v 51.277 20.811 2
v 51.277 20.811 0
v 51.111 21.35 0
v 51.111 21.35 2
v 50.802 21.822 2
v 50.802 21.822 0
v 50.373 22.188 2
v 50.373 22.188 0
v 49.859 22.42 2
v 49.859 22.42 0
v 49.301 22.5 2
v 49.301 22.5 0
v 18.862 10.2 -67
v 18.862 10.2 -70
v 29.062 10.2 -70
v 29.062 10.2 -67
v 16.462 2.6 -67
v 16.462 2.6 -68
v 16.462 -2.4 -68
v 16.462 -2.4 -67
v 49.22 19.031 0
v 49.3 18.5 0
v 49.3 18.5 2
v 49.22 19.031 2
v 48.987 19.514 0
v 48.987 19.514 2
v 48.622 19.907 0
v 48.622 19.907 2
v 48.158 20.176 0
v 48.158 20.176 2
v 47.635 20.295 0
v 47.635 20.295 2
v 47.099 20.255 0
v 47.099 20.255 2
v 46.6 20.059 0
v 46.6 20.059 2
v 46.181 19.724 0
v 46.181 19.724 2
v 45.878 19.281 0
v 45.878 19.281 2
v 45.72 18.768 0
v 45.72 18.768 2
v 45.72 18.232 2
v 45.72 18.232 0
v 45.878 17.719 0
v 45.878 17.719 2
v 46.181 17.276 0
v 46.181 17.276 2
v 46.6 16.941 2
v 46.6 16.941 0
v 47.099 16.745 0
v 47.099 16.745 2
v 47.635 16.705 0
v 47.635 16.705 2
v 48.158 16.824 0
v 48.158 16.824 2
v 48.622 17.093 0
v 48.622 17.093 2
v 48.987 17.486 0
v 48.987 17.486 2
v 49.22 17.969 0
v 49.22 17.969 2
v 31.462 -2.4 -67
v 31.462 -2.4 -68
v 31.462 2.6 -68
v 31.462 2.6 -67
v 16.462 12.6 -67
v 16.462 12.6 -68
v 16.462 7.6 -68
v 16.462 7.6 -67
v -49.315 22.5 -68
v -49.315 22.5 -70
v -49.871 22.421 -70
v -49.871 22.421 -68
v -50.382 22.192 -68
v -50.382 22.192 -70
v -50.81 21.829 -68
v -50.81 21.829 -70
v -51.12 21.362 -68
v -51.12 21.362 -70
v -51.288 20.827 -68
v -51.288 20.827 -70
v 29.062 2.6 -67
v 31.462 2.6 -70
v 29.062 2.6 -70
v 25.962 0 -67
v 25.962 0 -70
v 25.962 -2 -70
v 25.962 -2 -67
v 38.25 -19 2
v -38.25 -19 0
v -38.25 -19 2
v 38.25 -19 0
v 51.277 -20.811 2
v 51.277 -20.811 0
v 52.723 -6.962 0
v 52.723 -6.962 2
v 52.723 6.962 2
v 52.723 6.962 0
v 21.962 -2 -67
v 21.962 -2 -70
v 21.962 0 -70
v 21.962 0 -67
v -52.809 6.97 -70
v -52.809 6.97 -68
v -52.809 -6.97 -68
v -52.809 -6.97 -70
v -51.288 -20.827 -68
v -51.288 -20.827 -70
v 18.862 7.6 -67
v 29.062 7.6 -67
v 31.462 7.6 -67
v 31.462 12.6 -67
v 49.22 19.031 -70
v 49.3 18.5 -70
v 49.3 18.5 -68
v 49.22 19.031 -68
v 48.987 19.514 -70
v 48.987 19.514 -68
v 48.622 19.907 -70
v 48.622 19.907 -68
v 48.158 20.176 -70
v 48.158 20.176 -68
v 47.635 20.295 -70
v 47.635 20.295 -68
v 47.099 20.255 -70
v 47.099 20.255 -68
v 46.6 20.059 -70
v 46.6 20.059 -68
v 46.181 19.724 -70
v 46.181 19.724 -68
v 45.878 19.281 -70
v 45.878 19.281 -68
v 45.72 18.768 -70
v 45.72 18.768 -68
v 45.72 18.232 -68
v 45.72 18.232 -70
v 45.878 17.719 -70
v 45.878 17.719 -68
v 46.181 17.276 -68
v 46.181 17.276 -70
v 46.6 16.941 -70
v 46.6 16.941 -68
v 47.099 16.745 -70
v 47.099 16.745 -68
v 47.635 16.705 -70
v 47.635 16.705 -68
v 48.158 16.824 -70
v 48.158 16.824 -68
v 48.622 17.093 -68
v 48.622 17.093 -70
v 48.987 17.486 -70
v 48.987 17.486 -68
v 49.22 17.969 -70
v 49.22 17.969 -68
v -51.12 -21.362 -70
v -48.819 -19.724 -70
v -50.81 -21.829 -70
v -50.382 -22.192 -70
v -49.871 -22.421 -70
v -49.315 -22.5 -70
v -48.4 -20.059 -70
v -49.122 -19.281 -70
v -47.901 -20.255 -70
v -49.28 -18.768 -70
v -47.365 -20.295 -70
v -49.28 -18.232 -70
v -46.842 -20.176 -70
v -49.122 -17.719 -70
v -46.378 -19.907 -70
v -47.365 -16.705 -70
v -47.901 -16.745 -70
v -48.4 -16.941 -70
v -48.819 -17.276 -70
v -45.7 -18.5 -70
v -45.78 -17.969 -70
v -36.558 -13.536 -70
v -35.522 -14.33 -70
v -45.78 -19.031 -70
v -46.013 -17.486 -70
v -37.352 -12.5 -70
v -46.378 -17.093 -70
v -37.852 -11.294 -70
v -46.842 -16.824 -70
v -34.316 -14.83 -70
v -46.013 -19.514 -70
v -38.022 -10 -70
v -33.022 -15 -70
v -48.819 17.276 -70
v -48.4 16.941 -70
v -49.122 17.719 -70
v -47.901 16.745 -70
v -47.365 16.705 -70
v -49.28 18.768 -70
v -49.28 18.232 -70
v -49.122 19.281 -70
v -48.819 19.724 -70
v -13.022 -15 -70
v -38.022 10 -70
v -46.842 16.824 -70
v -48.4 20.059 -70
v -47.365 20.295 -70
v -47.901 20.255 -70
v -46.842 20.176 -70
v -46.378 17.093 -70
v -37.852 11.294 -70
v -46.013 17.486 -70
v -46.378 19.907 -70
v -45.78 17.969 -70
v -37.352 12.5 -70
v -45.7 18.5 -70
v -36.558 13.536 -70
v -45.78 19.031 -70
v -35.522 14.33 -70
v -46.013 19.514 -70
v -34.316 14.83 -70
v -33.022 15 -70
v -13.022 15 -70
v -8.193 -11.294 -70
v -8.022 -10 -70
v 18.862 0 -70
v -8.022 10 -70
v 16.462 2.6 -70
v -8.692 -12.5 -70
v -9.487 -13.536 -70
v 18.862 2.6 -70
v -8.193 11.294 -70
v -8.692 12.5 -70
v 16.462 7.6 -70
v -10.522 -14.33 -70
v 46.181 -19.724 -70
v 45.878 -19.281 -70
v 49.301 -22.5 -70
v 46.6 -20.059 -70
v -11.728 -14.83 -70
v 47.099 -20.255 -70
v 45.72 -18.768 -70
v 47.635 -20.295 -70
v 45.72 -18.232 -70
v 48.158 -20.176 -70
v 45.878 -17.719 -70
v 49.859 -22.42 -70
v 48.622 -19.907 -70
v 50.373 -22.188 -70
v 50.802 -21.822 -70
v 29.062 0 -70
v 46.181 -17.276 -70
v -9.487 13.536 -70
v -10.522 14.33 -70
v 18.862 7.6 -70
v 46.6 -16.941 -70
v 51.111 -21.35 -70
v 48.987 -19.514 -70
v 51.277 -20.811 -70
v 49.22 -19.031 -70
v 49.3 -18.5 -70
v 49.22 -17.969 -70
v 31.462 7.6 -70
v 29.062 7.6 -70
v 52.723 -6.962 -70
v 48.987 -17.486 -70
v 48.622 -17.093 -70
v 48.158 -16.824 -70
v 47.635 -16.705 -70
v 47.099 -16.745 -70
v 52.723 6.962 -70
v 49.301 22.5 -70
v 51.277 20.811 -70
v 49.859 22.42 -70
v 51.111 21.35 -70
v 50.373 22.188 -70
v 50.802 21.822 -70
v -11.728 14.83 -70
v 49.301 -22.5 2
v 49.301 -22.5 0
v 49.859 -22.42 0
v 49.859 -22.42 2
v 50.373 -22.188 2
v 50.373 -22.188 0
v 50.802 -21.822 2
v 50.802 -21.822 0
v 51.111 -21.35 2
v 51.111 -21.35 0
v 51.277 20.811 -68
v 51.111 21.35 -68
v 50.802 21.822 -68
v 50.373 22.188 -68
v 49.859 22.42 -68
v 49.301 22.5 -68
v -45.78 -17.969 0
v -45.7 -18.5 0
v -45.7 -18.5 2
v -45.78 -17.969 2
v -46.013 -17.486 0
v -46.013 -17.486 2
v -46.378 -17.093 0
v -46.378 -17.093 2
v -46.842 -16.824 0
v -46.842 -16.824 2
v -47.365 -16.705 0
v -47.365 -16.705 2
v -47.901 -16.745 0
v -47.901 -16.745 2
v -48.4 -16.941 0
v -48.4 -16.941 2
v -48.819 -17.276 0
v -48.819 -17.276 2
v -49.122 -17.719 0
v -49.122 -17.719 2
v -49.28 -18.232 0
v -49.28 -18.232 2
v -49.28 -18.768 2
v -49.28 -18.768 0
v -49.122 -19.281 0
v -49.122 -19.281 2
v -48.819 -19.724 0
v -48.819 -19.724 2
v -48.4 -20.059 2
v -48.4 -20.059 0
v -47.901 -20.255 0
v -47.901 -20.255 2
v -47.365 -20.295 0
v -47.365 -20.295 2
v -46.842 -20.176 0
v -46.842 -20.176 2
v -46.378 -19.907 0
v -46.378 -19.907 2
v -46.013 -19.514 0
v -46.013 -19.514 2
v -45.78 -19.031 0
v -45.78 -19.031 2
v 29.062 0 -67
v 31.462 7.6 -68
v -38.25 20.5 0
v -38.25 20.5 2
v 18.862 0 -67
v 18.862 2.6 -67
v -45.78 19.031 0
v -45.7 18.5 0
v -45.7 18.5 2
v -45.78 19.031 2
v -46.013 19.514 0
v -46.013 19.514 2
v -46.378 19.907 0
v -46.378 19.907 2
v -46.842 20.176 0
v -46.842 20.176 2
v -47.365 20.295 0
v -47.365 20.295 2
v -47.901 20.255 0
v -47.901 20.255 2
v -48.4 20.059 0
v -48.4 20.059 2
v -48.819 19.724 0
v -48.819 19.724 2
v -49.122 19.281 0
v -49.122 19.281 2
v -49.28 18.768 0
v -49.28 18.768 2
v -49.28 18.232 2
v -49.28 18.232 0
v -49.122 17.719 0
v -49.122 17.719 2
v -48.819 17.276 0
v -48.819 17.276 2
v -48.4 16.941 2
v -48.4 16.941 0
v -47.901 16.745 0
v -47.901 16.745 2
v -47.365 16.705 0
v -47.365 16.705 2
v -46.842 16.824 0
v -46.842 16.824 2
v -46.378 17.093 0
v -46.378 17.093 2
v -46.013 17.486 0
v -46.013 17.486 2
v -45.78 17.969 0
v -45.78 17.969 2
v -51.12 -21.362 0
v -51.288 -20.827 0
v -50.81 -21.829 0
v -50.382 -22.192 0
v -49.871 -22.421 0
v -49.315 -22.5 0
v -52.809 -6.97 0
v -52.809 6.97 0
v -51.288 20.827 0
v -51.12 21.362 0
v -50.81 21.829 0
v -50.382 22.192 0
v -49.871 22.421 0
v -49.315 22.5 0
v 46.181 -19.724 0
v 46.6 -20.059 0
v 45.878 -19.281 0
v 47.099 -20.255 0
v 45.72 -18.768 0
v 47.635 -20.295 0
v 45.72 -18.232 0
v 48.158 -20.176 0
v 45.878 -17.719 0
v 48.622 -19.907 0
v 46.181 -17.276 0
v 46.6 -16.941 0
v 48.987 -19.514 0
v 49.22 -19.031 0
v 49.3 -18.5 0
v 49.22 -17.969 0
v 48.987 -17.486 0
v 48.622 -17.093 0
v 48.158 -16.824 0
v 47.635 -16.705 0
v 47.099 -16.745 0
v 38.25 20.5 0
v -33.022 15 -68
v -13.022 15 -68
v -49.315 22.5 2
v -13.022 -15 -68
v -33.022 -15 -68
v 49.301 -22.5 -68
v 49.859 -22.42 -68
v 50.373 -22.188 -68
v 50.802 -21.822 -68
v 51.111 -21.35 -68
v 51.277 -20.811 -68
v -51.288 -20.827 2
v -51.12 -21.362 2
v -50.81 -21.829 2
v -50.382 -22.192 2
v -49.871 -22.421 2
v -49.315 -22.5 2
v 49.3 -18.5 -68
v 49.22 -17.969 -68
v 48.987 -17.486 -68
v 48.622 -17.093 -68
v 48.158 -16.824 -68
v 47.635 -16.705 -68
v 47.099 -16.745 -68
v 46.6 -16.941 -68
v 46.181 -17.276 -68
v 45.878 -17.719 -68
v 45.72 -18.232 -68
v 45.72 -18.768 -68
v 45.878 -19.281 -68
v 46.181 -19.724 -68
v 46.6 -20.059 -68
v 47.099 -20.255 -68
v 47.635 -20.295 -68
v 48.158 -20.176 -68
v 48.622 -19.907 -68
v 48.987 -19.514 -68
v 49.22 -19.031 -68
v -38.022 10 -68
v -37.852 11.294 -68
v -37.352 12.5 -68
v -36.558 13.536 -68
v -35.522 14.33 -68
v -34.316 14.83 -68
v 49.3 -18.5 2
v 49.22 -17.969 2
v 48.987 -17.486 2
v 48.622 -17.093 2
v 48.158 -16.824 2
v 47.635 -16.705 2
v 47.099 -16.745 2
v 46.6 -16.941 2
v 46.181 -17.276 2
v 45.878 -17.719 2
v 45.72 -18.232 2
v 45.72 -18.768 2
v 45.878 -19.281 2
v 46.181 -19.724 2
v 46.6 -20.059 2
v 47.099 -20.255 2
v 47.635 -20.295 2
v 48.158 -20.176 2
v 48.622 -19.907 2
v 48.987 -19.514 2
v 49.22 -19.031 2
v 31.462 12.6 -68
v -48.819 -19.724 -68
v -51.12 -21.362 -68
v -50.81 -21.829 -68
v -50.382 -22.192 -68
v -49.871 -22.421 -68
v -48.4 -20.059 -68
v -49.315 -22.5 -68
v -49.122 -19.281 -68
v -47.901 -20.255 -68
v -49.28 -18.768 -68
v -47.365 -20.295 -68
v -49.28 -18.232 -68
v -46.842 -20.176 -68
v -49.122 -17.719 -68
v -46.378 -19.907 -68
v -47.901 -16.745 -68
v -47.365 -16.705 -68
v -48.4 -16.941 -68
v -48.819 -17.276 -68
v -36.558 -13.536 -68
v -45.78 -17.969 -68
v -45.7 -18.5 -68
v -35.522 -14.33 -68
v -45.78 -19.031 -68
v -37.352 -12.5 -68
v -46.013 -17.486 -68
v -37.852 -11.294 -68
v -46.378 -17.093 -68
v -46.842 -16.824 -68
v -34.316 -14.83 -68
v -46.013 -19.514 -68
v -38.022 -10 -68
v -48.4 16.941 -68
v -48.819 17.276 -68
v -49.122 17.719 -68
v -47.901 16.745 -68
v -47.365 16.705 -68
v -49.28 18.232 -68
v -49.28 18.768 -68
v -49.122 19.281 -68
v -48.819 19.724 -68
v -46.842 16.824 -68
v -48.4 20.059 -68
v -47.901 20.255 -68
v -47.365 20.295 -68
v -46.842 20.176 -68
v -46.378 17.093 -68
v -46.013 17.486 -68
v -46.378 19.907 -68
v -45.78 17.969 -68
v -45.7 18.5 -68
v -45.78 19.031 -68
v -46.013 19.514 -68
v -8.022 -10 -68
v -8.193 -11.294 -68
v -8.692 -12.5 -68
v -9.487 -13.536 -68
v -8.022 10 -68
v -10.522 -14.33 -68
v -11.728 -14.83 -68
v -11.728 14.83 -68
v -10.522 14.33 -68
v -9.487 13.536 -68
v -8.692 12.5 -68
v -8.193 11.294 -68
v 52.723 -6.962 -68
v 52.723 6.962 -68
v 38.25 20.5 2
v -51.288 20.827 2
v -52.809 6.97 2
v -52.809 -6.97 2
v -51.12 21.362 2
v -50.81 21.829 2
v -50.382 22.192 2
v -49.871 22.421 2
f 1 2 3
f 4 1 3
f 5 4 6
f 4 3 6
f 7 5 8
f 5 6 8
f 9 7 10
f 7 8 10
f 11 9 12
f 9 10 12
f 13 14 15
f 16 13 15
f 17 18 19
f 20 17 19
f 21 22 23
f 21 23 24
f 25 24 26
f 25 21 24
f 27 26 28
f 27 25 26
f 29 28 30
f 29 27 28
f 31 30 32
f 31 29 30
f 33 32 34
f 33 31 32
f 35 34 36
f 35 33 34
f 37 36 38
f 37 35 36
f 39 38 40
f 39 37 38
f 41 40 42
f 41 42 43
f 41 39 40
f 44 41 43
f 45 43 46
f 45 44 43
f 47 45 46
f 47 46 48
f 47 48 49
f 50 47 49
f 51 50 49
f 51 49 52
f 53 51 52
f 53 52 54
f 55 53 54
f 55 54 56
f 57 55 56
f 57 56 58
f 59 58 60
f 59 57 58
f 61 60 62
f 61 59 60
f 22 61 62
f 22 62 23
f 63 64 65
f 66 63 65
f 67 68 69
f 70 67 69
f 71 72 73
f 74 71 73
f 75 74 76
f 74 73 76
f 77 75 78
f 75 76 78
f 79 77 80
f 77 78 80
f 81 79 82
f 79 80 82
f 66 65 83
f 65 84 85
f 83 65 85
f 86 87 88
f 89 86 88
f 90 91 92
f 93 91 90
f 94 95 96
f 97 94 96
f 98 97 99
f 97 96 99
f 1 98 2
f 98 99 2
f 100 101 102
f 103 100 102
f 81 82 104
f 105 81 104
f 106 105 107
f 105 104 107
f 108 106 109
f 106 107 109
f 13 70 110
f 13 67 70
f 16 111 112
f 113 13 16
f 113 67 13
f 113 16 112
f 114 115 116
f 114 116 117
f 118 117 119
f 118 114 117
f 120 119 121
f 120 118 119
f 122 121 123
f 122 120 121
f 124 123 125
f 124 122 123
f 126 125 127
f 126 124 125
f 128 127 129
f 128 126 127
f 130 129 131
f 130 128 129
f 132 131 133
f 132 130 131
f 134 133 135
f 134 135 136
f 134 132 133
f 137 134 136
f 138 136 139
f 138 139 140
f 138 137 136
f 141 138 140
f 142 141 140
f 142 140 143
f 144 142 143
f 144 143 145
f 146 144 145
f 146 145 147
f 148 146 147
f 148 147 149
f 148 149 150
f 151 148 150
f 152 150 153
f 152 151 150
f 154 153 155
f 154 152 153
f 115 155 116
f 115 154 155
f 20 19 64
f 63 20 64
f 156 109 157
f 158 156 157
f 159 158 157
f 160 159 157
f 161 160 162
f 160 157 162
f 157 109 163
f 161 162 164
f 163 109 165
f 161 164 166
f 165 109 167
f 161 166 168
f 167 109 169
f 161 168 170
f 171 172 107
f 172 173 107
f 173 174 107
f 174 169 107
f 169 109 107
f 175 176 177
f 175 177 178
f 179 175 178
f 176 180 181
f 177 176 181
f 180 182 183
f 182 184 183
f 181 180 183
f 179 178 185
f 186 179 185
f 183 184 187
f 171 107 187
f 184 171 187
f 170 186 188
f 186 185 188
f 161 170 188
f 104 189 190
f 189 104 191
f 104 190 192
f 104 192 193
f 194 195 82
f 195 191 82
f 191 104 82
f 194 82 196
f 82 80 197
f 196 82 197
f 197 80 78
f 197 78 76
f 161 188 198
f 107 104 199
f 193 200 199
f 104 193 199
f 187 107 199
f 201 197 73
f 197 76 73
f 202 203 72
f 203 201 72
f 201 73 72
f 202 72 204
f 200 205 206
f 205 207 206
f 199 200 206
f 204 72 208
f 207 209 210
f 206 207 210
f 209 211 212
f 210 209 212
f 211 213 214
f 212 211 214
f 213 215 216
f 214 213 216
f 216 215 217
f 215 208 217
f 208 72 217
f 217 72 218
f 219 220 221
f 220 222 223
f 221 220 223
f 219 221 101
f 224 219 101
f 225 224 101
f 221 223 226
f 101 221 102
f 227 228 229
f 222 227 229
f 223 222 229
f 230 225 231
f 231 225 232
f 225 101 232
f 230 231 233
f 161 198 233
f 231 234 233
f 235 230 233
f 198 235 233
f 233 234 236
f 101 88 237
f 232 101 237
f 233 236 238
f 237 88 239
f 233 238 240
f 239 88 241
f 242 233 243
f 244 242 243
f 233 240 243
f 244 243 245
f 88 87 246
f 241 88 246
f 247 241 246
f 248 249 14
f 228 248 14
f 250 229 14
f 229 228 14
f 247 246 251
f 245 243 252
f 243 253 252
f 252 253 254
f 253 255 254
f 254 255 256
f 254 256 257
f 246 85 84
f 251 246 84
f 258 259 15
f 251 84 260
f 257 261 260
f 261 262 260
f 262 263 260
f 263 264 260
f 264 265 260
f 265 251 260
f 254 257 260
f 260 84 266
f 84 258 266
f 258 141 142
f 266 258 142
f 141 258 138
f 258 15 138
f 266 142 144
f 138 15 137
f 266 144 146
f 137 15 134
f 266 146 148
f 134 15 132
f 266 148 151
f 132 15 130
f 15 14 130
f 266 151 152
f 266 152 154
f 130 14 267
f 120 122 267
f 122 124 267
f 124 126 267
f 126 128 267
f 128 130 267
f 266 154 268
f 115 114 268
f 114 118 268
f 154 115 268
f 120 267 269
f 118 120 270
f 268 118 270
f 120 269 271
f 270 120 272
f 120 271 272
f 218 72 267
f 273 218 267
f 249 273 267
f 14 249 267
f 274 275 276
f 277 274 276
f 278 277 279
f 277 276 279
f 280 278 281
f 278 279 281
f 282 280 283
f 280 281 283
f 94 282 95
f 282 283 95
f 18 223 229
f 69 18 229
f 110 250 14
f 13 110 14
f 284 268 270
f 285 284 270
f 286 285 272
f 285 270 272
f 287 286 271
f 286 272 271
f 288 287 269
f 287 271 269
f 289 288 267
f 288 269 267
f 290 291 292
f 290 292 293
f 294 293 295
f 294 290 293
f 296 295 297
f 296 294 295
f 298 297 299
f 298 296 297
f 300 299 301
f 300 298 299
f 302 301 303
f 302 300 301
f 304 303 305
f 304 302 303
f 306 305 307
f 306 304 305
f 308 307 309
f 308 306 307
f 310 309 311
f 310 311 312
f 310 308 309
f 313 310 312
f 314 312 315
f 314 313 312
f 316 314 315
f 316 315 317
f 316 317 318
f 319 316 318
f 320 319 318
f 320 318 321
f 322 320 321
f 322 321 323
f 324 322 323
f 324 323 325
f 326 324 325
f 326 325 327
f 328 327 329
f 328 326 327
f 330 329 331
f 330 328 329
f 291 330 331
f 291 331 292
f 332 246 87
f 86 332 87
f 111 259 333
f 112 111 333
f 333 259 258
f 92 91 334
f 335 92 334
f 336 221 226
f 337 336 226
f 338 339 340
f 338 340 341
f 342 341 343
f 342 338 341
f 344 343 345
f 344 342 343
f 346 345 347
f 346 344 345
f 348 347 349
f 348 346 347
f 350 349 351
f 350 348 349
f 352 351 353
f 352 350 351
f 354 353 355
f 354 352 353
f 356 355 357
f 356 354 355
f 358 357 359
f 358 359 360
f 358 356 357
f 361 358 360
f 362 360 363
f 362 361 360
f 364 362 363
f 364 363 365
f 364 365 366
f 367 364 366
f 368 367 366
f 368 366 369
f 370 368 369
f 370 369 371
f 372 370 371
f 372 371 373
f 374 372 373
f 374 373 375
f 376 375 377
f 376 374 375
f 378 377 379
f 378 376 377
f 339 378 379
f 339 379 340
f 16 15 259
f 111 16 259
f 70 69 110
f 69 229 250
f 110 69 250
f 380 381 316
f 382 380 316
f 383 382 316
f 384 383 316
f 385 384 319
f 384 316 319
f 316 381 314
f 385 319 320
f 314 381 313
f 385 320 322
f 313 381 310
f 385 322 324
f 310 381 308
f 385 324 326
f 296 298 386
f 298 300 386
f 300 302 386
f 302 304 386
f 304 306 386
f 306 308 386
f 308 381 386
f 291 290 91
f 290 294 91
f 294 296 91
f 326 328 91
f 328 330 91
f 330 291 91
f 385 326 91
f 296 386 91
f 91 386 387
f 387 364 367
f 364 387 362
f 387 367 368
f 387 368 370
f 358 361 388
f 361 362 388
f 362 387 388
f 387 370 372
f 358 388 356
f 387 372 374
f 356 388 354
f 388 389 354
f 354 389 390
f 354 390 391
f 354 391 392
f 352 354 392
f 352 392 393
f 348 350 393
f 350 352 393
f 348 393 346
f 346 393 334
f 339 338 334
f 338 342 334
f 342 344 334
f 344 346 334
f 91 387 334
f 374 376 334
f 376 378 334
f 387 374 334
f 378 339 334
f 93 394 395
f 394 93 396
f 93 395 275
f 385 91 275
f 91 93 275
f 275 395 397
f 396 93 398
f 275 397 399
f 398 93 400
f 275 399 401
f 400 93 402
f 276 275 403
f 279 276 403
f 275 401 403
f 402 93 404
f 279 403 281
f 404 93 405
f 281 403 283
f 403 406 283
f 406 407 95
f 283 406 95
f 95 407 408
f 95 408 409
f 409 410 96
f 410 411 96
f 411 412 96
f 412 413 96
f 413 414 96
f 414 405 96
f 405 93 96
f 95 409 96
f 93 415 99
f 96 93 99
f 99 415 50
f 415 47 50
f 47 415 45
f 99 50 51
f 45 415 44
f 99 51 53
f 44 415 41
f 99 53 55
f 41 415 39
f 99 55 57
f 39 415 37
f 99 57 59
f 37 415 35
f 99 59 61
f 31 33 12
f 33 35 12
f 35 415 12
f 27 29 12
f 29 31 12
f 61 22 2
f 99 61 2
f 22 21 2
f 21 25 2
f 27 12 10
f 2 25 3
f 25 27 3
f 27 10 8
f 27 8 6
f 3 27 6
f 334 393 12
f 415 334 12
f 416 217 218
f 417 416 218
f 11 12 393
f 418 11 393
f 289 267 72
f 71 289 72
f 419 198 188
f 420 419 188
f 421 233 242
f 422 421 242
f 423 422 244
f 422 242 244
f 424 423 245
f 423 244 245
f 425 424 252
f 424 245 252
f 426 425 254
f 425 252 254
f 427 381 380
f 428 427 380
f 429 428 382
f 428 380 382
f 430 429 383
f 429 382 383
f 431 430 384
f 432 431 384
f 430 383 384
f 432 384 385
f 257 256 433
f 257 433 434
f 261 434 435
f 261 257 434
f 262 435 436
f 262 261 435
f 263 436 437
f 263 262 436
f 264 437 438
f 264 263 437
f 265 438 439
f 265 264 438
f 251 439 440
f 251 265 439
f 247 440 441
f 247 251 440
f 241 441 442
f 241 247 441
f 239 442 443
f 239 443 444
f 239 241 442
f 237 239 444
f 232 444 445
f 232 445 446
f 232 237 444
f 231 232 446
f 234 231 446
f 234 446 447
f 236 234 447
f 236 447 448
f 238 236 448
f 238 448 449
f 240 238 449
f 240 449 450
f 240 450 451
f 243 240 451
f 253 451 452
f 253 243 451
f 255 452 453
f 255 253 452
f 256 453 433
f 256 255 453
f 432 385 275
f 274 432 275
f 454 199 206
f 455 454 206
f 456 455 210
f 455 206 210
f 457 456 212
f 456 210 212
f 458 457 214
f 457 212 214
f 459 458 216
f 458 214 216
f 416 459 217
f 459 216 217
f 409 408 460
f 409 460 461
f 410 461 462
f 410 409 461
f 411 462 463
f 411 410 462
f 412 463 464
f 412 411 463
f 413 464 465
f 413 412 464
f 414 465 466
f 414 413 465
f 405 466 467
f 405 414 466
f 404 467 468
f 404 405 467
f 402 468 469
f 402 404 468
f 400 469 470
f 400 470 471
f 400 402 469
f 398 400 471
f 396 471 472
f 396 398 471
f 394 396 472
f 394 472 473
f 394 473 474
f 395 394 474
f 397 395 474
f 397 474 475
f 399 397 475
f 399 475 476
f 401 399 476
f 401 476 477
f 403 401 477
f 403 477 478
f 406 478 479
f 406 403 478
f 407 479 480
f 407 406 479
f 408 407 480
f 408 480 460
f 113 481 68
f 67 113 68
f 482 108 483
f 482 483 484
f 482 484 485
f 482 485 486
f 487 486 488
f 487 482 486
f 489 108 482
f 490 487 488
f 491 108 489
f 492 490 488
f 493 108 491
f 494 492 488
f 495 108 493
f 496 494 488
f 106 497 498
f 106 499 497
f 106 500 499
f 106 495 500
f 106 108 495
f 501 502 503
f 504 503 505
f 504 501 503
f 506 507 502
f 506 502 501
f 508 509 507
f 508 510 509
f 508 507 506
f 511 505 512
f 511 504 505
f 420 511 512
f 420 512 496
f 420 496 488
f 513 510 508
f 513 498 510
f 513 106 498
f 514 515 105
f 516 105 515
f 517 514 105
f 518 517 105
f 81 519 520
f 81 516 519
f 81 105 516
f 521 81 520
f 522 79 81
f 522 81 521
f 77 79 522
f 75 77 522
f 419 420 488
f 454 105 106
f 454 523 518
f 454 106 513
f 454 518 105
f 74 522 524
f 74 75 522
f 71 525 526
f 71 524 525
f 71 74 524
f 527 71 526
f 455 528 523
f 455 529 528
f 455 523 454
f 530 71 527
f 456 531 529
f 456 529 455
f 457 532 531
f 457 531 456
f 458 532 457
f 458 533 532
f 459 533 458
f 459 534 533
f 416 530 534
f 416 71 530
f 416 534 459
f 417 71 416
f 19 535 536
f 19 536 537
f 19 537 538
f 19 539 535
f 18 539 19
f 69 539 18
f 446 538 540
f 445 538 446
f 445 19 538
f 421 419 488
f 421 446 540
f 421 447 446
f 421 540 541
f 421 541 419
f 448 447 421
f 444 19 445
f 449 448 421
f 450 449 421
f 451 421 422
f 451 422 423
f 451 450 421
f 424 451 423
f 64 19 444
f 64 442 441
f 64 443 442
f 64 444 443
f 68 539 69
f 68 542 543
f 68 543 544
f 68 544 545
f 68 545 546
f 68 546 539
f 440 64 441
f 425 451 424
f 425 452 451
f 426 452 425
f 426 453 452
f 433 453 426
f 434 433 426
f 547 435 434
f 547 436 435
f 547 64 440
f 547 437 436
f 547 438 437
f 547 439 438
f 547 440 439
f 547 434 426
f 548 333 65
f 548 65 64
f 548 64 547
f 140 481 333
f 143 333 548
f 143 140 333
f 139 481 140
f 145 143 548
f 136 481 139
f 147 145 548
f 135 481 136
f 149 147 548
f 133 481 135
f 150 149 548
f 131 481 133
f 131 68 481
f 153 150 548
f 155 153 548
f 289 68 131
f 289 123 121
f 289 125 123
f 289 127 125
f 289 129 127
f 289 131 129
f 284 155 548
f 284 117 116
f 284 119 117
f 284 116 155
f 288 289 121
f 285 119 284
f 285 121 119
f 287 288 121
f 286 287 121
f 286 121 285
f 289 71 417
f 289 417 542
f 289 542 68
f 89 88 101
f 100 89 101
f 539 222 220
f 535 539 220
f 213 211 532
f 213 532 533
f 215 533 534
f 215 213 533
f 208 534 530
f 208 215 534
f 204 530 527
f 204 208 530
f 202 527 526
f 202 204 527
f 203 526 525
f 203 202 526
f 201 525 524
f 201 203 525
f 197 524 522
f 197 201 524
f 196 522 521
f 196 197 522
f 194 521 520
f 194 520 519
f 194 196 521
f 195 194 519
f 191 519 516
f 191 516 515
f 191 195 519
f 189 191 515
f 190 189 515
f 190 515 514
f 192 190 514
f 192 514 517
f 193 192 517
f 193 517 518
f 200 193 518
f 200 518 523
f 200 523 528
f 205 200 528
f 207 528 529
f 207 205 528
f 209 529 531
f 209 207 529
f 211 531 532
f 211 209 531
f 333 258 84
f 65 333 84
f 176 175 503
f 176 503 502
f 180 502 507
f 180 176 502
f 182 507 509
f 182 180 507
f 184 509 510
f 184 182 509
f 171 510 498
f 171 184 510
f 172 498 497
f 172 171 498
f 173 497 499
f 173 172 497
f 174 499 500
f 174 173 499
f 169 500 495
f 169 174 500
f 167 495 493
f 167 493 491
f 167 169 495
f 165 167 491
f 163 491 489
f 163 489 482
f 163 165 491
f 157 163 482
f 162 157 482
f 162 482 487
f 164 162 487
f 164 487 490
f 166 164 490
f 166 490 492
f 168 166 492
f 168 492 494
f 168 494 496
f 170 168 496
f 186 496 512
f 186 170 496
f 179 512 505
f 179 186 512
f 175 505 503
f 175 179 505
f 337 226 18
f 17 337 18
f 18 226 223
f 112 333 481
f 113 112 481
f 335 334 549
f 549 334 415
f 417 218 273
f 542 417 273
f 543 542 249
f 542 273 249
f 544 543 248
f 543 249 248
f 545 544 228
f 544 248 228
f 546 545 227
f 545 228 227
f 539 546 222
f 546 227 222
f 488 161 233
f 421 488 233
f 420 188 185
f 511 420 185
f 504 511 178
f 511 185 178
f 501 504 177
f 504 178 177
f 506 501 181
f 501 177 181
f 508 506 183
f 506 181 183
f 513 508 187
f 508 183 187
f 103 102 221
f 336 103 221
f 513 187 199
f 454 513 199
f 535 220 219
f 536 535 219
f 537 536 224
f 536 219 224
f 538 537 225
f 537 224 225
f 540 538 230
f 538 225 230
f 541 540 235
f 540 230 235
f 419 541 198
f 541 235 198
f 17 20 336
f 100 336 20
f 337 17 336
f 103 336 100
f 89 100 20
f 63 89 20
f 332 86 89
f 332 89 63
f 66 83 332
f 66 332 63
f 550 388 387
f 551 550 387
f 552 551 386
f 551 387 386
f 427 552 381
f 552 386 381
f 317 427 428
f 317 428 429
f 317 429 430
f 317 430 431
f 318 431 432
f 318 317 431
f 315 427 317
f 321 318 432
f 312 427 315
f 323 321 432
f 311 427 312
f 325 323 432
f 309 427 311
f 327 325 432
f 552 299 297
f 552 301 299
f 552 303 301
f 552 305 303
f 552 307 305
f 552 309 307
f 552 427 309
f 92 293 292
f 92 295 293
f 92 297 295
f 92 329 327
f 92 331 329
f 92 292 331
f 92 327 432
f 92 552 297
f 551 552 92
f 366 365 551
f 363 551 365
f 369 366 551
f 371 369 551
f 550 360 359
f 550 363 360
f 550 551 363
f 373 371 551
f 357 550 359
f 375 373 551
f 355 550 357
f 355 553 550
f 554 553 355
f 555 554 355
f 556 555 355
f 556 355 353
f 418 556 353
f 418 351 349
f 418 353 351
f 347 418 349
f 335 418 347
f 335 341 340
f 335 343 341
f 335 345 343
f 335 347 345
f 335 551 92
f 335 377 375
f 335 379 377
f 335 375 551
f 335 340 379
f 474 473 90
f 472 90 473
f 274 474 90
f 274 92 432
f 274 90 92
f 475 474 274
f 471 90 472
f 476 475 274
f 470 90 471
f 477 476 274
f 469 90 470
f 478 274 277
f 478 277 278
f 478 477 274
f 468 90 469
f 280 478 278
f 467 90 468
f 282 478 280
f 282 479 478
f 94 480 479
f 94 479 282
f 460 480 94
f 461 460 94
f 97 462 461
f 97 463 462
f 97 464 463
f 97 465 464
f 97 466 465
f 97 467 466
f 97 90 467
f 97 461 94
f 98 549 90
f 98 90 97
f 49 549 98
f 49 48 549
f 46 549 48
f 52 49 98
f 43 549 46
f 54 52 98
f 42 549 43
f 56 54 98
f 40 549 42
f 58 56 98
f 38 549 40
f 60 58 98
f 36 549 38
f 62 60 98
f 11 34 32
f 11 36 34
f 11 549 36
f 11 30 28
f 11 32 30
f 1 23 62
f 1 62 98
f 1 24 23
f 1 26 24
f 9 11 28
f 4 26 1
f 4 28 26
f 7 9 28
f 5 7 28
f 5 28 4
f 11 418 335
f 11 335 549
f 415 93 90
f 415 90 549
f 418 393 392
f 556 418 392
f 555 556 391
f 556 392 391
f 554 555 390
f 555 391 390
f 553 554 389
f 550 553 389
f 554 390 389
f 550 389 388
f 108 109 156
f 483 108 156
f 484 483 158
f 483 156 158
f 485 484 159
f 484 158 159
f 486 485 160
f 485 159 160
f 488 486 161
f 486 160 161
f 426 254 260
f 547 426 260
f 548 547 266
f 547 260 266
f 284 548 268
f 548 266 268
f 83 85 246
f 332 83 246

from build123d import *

# Parameters (mm, degrees)
F0_R     = 1.8
F0_W     = 76.5
F0_H     = 39.5
F1_DEPTH = 2
F3_R     = 1.8
F4_DEPTH = 2
F5_DEPTH = 3


with BuildPart() as f1:
    # F0 (on Top) → F1 (new body)
    with BuildSketch(Plane.XY):
        with BuildLine():
            ThreePointArc((-49.315213, 22.5), (-50.608846, 22.025292), (-51.28838, 20.826514))
            ThreePointArc((-51.28838, 20.826514), (-52.9999, 0), (-51.28838, -20.826514))
            ThreePointArc((-51.28838, -20.826514), (-50.608846, -22.025292), (-49.315213, -22.5))
            Line((-49.315213, -22.5), (49.301112, -22.5))
            ThreePointArc((49.301112, -22.5), (50.6008, -22.020136), (51.276814, -20.810813))
            ThreePointArc((51.276814, -20.810813), (52.903764, 0), (51.276814, 20.810813))
            ThreePointArc((51.276814, 20.810813), (50.6008, 22.020136), (49.301112, 22.5))
            Line((49.301112, 22.5), (-49.315213, 22.5))
        make_face()
        with Locations((-47.5, -18.5)):
            Circle(F0_R, mode=Mode.SUBTRACT)
        with Locations((47.5, -18.5)):
            Circle(F0_R, mode=Mode.SUBTRACT)
        with Locations((-47.5, 18.5)):
            Circle(F0_R, mode=Mode.SUBTRACT)
        with Locations((0, 0.75)):
            Rectangle(F0_W, F0_H, mode=Mode.SUBTRACT)
        with Locations((47.5, 18.5)):
            Circle(F0_R, mode=Mode.SUBTRACT)
    extrude(amount=F1_DEPTH)


with BuildPart() as f4:
    # F3 (on offset) → F4 (new body)
    with BuildSketch(Plane.XY.offset(-70)):
        with BuildLine():
            ThreePointArc((-49.315213, 22.5), (-50.608846, 22.025292), (-51.28838, 20.826514))
            ThreePointArc((-51.28838, 20.826514), (-52.9999, 0), (-51.28838, -20.826514))
            ThreePointArc((-51.28838, -20.826514), (-50.608846, -22.025292), (-49.315213, -22.5))
            Line((-49.315213, -22.5), (49.301112, -22.5))
            ThreePointArc((49.301112, -22.5), (50.6008, -22.020136), (51.276814, -20.810813))
            ThreePointArc((51.276814, -20.810813), (52.903764, 0), (51.276814, 20.810813))
            ThreePointArc((51.276814, 20.810813), (50.6008, 22.020136), (49.301112, 22.5))
            Line((49.301112, 22.5), (-49.315213, 22.5))
        make_face()
        with Locations((-47.5, -18.5)):
            Circle(F3_R, mode=Mode.SUBTRACT)
        with Locations((47.5, -18.5)):
            Circle(F3_R, mode=Mode.SUBTRACT)
        with BuildLine():
            Line((-13.02225, -15), (-33.02225, -15))
            ThreePointArc((-33.02225, -15), (-36.557784, -13.535534), (-38.02225, -10))
            Line((-38.02225, -10), (-38.02225, 10))
            ThreePointArc((-38.02225, 10), (-36.557784, 13.535534), (-33.02225, 15))
            Line((-33.02225, 15), (-13.02225, 15))
            ThreePointArc((-13.02225, 15), (-9.486716, 13.535534), (-8.02225, 10))
            Line((-8.02225, 10), (-8.02225, -10))
            ThreePointArc((-8.02225, -10), (-9.486716, -13.535534), (-13.02225, -15))
        make_face(mode=Mode.SUBTRACT)
        with Locations((-47.5, 18.5)):
            Circle(F3_R, mode=Mode.SUBTRACT)
        Polygon((16.462328, -2.4), (16.462328, 2.6), (16.462328, 7.6), (16.462328, 12.6), (31.462328, 12.6), (31.462328, 7.6), (31.462328, 2.6), (31.462328, -2.4), align=None, mode=Mode.SUBTRACT)
        with Locations((47.5, 18.5)):
            Circle(F3_R, mode=Mode.SUBTRACT)
    extrude(amount=F4_DEPTH)

    # F3 (on offset) → F5 (join)
    with BuildSketch(Plane.XY.offset(-70)):
        Polygon((16.462328, 7.6), (18.862328, 7.6), (18.862328, 10.2), (29.062328, 10.2), (29.062328, 7.6), (31.462328, 7.6), (31.462328, 12.6), (16.462328, 12.6), align=None)
        Polygon((21.962328, 0), (18.862328, 0), (18.862328, 2.6), (16.462328, 2.6), (16.462328, -2.4), (31.462328, -2.4), (31.462328, 2.6), (29.062328, 2.6), (29.062328, 0), (25.962328, 0), (25.962328, -2), (21.962328, -2), align=None)
    extrude(amount=F5_DEPTH)


solid = Compound([f1.part, f4.part])
